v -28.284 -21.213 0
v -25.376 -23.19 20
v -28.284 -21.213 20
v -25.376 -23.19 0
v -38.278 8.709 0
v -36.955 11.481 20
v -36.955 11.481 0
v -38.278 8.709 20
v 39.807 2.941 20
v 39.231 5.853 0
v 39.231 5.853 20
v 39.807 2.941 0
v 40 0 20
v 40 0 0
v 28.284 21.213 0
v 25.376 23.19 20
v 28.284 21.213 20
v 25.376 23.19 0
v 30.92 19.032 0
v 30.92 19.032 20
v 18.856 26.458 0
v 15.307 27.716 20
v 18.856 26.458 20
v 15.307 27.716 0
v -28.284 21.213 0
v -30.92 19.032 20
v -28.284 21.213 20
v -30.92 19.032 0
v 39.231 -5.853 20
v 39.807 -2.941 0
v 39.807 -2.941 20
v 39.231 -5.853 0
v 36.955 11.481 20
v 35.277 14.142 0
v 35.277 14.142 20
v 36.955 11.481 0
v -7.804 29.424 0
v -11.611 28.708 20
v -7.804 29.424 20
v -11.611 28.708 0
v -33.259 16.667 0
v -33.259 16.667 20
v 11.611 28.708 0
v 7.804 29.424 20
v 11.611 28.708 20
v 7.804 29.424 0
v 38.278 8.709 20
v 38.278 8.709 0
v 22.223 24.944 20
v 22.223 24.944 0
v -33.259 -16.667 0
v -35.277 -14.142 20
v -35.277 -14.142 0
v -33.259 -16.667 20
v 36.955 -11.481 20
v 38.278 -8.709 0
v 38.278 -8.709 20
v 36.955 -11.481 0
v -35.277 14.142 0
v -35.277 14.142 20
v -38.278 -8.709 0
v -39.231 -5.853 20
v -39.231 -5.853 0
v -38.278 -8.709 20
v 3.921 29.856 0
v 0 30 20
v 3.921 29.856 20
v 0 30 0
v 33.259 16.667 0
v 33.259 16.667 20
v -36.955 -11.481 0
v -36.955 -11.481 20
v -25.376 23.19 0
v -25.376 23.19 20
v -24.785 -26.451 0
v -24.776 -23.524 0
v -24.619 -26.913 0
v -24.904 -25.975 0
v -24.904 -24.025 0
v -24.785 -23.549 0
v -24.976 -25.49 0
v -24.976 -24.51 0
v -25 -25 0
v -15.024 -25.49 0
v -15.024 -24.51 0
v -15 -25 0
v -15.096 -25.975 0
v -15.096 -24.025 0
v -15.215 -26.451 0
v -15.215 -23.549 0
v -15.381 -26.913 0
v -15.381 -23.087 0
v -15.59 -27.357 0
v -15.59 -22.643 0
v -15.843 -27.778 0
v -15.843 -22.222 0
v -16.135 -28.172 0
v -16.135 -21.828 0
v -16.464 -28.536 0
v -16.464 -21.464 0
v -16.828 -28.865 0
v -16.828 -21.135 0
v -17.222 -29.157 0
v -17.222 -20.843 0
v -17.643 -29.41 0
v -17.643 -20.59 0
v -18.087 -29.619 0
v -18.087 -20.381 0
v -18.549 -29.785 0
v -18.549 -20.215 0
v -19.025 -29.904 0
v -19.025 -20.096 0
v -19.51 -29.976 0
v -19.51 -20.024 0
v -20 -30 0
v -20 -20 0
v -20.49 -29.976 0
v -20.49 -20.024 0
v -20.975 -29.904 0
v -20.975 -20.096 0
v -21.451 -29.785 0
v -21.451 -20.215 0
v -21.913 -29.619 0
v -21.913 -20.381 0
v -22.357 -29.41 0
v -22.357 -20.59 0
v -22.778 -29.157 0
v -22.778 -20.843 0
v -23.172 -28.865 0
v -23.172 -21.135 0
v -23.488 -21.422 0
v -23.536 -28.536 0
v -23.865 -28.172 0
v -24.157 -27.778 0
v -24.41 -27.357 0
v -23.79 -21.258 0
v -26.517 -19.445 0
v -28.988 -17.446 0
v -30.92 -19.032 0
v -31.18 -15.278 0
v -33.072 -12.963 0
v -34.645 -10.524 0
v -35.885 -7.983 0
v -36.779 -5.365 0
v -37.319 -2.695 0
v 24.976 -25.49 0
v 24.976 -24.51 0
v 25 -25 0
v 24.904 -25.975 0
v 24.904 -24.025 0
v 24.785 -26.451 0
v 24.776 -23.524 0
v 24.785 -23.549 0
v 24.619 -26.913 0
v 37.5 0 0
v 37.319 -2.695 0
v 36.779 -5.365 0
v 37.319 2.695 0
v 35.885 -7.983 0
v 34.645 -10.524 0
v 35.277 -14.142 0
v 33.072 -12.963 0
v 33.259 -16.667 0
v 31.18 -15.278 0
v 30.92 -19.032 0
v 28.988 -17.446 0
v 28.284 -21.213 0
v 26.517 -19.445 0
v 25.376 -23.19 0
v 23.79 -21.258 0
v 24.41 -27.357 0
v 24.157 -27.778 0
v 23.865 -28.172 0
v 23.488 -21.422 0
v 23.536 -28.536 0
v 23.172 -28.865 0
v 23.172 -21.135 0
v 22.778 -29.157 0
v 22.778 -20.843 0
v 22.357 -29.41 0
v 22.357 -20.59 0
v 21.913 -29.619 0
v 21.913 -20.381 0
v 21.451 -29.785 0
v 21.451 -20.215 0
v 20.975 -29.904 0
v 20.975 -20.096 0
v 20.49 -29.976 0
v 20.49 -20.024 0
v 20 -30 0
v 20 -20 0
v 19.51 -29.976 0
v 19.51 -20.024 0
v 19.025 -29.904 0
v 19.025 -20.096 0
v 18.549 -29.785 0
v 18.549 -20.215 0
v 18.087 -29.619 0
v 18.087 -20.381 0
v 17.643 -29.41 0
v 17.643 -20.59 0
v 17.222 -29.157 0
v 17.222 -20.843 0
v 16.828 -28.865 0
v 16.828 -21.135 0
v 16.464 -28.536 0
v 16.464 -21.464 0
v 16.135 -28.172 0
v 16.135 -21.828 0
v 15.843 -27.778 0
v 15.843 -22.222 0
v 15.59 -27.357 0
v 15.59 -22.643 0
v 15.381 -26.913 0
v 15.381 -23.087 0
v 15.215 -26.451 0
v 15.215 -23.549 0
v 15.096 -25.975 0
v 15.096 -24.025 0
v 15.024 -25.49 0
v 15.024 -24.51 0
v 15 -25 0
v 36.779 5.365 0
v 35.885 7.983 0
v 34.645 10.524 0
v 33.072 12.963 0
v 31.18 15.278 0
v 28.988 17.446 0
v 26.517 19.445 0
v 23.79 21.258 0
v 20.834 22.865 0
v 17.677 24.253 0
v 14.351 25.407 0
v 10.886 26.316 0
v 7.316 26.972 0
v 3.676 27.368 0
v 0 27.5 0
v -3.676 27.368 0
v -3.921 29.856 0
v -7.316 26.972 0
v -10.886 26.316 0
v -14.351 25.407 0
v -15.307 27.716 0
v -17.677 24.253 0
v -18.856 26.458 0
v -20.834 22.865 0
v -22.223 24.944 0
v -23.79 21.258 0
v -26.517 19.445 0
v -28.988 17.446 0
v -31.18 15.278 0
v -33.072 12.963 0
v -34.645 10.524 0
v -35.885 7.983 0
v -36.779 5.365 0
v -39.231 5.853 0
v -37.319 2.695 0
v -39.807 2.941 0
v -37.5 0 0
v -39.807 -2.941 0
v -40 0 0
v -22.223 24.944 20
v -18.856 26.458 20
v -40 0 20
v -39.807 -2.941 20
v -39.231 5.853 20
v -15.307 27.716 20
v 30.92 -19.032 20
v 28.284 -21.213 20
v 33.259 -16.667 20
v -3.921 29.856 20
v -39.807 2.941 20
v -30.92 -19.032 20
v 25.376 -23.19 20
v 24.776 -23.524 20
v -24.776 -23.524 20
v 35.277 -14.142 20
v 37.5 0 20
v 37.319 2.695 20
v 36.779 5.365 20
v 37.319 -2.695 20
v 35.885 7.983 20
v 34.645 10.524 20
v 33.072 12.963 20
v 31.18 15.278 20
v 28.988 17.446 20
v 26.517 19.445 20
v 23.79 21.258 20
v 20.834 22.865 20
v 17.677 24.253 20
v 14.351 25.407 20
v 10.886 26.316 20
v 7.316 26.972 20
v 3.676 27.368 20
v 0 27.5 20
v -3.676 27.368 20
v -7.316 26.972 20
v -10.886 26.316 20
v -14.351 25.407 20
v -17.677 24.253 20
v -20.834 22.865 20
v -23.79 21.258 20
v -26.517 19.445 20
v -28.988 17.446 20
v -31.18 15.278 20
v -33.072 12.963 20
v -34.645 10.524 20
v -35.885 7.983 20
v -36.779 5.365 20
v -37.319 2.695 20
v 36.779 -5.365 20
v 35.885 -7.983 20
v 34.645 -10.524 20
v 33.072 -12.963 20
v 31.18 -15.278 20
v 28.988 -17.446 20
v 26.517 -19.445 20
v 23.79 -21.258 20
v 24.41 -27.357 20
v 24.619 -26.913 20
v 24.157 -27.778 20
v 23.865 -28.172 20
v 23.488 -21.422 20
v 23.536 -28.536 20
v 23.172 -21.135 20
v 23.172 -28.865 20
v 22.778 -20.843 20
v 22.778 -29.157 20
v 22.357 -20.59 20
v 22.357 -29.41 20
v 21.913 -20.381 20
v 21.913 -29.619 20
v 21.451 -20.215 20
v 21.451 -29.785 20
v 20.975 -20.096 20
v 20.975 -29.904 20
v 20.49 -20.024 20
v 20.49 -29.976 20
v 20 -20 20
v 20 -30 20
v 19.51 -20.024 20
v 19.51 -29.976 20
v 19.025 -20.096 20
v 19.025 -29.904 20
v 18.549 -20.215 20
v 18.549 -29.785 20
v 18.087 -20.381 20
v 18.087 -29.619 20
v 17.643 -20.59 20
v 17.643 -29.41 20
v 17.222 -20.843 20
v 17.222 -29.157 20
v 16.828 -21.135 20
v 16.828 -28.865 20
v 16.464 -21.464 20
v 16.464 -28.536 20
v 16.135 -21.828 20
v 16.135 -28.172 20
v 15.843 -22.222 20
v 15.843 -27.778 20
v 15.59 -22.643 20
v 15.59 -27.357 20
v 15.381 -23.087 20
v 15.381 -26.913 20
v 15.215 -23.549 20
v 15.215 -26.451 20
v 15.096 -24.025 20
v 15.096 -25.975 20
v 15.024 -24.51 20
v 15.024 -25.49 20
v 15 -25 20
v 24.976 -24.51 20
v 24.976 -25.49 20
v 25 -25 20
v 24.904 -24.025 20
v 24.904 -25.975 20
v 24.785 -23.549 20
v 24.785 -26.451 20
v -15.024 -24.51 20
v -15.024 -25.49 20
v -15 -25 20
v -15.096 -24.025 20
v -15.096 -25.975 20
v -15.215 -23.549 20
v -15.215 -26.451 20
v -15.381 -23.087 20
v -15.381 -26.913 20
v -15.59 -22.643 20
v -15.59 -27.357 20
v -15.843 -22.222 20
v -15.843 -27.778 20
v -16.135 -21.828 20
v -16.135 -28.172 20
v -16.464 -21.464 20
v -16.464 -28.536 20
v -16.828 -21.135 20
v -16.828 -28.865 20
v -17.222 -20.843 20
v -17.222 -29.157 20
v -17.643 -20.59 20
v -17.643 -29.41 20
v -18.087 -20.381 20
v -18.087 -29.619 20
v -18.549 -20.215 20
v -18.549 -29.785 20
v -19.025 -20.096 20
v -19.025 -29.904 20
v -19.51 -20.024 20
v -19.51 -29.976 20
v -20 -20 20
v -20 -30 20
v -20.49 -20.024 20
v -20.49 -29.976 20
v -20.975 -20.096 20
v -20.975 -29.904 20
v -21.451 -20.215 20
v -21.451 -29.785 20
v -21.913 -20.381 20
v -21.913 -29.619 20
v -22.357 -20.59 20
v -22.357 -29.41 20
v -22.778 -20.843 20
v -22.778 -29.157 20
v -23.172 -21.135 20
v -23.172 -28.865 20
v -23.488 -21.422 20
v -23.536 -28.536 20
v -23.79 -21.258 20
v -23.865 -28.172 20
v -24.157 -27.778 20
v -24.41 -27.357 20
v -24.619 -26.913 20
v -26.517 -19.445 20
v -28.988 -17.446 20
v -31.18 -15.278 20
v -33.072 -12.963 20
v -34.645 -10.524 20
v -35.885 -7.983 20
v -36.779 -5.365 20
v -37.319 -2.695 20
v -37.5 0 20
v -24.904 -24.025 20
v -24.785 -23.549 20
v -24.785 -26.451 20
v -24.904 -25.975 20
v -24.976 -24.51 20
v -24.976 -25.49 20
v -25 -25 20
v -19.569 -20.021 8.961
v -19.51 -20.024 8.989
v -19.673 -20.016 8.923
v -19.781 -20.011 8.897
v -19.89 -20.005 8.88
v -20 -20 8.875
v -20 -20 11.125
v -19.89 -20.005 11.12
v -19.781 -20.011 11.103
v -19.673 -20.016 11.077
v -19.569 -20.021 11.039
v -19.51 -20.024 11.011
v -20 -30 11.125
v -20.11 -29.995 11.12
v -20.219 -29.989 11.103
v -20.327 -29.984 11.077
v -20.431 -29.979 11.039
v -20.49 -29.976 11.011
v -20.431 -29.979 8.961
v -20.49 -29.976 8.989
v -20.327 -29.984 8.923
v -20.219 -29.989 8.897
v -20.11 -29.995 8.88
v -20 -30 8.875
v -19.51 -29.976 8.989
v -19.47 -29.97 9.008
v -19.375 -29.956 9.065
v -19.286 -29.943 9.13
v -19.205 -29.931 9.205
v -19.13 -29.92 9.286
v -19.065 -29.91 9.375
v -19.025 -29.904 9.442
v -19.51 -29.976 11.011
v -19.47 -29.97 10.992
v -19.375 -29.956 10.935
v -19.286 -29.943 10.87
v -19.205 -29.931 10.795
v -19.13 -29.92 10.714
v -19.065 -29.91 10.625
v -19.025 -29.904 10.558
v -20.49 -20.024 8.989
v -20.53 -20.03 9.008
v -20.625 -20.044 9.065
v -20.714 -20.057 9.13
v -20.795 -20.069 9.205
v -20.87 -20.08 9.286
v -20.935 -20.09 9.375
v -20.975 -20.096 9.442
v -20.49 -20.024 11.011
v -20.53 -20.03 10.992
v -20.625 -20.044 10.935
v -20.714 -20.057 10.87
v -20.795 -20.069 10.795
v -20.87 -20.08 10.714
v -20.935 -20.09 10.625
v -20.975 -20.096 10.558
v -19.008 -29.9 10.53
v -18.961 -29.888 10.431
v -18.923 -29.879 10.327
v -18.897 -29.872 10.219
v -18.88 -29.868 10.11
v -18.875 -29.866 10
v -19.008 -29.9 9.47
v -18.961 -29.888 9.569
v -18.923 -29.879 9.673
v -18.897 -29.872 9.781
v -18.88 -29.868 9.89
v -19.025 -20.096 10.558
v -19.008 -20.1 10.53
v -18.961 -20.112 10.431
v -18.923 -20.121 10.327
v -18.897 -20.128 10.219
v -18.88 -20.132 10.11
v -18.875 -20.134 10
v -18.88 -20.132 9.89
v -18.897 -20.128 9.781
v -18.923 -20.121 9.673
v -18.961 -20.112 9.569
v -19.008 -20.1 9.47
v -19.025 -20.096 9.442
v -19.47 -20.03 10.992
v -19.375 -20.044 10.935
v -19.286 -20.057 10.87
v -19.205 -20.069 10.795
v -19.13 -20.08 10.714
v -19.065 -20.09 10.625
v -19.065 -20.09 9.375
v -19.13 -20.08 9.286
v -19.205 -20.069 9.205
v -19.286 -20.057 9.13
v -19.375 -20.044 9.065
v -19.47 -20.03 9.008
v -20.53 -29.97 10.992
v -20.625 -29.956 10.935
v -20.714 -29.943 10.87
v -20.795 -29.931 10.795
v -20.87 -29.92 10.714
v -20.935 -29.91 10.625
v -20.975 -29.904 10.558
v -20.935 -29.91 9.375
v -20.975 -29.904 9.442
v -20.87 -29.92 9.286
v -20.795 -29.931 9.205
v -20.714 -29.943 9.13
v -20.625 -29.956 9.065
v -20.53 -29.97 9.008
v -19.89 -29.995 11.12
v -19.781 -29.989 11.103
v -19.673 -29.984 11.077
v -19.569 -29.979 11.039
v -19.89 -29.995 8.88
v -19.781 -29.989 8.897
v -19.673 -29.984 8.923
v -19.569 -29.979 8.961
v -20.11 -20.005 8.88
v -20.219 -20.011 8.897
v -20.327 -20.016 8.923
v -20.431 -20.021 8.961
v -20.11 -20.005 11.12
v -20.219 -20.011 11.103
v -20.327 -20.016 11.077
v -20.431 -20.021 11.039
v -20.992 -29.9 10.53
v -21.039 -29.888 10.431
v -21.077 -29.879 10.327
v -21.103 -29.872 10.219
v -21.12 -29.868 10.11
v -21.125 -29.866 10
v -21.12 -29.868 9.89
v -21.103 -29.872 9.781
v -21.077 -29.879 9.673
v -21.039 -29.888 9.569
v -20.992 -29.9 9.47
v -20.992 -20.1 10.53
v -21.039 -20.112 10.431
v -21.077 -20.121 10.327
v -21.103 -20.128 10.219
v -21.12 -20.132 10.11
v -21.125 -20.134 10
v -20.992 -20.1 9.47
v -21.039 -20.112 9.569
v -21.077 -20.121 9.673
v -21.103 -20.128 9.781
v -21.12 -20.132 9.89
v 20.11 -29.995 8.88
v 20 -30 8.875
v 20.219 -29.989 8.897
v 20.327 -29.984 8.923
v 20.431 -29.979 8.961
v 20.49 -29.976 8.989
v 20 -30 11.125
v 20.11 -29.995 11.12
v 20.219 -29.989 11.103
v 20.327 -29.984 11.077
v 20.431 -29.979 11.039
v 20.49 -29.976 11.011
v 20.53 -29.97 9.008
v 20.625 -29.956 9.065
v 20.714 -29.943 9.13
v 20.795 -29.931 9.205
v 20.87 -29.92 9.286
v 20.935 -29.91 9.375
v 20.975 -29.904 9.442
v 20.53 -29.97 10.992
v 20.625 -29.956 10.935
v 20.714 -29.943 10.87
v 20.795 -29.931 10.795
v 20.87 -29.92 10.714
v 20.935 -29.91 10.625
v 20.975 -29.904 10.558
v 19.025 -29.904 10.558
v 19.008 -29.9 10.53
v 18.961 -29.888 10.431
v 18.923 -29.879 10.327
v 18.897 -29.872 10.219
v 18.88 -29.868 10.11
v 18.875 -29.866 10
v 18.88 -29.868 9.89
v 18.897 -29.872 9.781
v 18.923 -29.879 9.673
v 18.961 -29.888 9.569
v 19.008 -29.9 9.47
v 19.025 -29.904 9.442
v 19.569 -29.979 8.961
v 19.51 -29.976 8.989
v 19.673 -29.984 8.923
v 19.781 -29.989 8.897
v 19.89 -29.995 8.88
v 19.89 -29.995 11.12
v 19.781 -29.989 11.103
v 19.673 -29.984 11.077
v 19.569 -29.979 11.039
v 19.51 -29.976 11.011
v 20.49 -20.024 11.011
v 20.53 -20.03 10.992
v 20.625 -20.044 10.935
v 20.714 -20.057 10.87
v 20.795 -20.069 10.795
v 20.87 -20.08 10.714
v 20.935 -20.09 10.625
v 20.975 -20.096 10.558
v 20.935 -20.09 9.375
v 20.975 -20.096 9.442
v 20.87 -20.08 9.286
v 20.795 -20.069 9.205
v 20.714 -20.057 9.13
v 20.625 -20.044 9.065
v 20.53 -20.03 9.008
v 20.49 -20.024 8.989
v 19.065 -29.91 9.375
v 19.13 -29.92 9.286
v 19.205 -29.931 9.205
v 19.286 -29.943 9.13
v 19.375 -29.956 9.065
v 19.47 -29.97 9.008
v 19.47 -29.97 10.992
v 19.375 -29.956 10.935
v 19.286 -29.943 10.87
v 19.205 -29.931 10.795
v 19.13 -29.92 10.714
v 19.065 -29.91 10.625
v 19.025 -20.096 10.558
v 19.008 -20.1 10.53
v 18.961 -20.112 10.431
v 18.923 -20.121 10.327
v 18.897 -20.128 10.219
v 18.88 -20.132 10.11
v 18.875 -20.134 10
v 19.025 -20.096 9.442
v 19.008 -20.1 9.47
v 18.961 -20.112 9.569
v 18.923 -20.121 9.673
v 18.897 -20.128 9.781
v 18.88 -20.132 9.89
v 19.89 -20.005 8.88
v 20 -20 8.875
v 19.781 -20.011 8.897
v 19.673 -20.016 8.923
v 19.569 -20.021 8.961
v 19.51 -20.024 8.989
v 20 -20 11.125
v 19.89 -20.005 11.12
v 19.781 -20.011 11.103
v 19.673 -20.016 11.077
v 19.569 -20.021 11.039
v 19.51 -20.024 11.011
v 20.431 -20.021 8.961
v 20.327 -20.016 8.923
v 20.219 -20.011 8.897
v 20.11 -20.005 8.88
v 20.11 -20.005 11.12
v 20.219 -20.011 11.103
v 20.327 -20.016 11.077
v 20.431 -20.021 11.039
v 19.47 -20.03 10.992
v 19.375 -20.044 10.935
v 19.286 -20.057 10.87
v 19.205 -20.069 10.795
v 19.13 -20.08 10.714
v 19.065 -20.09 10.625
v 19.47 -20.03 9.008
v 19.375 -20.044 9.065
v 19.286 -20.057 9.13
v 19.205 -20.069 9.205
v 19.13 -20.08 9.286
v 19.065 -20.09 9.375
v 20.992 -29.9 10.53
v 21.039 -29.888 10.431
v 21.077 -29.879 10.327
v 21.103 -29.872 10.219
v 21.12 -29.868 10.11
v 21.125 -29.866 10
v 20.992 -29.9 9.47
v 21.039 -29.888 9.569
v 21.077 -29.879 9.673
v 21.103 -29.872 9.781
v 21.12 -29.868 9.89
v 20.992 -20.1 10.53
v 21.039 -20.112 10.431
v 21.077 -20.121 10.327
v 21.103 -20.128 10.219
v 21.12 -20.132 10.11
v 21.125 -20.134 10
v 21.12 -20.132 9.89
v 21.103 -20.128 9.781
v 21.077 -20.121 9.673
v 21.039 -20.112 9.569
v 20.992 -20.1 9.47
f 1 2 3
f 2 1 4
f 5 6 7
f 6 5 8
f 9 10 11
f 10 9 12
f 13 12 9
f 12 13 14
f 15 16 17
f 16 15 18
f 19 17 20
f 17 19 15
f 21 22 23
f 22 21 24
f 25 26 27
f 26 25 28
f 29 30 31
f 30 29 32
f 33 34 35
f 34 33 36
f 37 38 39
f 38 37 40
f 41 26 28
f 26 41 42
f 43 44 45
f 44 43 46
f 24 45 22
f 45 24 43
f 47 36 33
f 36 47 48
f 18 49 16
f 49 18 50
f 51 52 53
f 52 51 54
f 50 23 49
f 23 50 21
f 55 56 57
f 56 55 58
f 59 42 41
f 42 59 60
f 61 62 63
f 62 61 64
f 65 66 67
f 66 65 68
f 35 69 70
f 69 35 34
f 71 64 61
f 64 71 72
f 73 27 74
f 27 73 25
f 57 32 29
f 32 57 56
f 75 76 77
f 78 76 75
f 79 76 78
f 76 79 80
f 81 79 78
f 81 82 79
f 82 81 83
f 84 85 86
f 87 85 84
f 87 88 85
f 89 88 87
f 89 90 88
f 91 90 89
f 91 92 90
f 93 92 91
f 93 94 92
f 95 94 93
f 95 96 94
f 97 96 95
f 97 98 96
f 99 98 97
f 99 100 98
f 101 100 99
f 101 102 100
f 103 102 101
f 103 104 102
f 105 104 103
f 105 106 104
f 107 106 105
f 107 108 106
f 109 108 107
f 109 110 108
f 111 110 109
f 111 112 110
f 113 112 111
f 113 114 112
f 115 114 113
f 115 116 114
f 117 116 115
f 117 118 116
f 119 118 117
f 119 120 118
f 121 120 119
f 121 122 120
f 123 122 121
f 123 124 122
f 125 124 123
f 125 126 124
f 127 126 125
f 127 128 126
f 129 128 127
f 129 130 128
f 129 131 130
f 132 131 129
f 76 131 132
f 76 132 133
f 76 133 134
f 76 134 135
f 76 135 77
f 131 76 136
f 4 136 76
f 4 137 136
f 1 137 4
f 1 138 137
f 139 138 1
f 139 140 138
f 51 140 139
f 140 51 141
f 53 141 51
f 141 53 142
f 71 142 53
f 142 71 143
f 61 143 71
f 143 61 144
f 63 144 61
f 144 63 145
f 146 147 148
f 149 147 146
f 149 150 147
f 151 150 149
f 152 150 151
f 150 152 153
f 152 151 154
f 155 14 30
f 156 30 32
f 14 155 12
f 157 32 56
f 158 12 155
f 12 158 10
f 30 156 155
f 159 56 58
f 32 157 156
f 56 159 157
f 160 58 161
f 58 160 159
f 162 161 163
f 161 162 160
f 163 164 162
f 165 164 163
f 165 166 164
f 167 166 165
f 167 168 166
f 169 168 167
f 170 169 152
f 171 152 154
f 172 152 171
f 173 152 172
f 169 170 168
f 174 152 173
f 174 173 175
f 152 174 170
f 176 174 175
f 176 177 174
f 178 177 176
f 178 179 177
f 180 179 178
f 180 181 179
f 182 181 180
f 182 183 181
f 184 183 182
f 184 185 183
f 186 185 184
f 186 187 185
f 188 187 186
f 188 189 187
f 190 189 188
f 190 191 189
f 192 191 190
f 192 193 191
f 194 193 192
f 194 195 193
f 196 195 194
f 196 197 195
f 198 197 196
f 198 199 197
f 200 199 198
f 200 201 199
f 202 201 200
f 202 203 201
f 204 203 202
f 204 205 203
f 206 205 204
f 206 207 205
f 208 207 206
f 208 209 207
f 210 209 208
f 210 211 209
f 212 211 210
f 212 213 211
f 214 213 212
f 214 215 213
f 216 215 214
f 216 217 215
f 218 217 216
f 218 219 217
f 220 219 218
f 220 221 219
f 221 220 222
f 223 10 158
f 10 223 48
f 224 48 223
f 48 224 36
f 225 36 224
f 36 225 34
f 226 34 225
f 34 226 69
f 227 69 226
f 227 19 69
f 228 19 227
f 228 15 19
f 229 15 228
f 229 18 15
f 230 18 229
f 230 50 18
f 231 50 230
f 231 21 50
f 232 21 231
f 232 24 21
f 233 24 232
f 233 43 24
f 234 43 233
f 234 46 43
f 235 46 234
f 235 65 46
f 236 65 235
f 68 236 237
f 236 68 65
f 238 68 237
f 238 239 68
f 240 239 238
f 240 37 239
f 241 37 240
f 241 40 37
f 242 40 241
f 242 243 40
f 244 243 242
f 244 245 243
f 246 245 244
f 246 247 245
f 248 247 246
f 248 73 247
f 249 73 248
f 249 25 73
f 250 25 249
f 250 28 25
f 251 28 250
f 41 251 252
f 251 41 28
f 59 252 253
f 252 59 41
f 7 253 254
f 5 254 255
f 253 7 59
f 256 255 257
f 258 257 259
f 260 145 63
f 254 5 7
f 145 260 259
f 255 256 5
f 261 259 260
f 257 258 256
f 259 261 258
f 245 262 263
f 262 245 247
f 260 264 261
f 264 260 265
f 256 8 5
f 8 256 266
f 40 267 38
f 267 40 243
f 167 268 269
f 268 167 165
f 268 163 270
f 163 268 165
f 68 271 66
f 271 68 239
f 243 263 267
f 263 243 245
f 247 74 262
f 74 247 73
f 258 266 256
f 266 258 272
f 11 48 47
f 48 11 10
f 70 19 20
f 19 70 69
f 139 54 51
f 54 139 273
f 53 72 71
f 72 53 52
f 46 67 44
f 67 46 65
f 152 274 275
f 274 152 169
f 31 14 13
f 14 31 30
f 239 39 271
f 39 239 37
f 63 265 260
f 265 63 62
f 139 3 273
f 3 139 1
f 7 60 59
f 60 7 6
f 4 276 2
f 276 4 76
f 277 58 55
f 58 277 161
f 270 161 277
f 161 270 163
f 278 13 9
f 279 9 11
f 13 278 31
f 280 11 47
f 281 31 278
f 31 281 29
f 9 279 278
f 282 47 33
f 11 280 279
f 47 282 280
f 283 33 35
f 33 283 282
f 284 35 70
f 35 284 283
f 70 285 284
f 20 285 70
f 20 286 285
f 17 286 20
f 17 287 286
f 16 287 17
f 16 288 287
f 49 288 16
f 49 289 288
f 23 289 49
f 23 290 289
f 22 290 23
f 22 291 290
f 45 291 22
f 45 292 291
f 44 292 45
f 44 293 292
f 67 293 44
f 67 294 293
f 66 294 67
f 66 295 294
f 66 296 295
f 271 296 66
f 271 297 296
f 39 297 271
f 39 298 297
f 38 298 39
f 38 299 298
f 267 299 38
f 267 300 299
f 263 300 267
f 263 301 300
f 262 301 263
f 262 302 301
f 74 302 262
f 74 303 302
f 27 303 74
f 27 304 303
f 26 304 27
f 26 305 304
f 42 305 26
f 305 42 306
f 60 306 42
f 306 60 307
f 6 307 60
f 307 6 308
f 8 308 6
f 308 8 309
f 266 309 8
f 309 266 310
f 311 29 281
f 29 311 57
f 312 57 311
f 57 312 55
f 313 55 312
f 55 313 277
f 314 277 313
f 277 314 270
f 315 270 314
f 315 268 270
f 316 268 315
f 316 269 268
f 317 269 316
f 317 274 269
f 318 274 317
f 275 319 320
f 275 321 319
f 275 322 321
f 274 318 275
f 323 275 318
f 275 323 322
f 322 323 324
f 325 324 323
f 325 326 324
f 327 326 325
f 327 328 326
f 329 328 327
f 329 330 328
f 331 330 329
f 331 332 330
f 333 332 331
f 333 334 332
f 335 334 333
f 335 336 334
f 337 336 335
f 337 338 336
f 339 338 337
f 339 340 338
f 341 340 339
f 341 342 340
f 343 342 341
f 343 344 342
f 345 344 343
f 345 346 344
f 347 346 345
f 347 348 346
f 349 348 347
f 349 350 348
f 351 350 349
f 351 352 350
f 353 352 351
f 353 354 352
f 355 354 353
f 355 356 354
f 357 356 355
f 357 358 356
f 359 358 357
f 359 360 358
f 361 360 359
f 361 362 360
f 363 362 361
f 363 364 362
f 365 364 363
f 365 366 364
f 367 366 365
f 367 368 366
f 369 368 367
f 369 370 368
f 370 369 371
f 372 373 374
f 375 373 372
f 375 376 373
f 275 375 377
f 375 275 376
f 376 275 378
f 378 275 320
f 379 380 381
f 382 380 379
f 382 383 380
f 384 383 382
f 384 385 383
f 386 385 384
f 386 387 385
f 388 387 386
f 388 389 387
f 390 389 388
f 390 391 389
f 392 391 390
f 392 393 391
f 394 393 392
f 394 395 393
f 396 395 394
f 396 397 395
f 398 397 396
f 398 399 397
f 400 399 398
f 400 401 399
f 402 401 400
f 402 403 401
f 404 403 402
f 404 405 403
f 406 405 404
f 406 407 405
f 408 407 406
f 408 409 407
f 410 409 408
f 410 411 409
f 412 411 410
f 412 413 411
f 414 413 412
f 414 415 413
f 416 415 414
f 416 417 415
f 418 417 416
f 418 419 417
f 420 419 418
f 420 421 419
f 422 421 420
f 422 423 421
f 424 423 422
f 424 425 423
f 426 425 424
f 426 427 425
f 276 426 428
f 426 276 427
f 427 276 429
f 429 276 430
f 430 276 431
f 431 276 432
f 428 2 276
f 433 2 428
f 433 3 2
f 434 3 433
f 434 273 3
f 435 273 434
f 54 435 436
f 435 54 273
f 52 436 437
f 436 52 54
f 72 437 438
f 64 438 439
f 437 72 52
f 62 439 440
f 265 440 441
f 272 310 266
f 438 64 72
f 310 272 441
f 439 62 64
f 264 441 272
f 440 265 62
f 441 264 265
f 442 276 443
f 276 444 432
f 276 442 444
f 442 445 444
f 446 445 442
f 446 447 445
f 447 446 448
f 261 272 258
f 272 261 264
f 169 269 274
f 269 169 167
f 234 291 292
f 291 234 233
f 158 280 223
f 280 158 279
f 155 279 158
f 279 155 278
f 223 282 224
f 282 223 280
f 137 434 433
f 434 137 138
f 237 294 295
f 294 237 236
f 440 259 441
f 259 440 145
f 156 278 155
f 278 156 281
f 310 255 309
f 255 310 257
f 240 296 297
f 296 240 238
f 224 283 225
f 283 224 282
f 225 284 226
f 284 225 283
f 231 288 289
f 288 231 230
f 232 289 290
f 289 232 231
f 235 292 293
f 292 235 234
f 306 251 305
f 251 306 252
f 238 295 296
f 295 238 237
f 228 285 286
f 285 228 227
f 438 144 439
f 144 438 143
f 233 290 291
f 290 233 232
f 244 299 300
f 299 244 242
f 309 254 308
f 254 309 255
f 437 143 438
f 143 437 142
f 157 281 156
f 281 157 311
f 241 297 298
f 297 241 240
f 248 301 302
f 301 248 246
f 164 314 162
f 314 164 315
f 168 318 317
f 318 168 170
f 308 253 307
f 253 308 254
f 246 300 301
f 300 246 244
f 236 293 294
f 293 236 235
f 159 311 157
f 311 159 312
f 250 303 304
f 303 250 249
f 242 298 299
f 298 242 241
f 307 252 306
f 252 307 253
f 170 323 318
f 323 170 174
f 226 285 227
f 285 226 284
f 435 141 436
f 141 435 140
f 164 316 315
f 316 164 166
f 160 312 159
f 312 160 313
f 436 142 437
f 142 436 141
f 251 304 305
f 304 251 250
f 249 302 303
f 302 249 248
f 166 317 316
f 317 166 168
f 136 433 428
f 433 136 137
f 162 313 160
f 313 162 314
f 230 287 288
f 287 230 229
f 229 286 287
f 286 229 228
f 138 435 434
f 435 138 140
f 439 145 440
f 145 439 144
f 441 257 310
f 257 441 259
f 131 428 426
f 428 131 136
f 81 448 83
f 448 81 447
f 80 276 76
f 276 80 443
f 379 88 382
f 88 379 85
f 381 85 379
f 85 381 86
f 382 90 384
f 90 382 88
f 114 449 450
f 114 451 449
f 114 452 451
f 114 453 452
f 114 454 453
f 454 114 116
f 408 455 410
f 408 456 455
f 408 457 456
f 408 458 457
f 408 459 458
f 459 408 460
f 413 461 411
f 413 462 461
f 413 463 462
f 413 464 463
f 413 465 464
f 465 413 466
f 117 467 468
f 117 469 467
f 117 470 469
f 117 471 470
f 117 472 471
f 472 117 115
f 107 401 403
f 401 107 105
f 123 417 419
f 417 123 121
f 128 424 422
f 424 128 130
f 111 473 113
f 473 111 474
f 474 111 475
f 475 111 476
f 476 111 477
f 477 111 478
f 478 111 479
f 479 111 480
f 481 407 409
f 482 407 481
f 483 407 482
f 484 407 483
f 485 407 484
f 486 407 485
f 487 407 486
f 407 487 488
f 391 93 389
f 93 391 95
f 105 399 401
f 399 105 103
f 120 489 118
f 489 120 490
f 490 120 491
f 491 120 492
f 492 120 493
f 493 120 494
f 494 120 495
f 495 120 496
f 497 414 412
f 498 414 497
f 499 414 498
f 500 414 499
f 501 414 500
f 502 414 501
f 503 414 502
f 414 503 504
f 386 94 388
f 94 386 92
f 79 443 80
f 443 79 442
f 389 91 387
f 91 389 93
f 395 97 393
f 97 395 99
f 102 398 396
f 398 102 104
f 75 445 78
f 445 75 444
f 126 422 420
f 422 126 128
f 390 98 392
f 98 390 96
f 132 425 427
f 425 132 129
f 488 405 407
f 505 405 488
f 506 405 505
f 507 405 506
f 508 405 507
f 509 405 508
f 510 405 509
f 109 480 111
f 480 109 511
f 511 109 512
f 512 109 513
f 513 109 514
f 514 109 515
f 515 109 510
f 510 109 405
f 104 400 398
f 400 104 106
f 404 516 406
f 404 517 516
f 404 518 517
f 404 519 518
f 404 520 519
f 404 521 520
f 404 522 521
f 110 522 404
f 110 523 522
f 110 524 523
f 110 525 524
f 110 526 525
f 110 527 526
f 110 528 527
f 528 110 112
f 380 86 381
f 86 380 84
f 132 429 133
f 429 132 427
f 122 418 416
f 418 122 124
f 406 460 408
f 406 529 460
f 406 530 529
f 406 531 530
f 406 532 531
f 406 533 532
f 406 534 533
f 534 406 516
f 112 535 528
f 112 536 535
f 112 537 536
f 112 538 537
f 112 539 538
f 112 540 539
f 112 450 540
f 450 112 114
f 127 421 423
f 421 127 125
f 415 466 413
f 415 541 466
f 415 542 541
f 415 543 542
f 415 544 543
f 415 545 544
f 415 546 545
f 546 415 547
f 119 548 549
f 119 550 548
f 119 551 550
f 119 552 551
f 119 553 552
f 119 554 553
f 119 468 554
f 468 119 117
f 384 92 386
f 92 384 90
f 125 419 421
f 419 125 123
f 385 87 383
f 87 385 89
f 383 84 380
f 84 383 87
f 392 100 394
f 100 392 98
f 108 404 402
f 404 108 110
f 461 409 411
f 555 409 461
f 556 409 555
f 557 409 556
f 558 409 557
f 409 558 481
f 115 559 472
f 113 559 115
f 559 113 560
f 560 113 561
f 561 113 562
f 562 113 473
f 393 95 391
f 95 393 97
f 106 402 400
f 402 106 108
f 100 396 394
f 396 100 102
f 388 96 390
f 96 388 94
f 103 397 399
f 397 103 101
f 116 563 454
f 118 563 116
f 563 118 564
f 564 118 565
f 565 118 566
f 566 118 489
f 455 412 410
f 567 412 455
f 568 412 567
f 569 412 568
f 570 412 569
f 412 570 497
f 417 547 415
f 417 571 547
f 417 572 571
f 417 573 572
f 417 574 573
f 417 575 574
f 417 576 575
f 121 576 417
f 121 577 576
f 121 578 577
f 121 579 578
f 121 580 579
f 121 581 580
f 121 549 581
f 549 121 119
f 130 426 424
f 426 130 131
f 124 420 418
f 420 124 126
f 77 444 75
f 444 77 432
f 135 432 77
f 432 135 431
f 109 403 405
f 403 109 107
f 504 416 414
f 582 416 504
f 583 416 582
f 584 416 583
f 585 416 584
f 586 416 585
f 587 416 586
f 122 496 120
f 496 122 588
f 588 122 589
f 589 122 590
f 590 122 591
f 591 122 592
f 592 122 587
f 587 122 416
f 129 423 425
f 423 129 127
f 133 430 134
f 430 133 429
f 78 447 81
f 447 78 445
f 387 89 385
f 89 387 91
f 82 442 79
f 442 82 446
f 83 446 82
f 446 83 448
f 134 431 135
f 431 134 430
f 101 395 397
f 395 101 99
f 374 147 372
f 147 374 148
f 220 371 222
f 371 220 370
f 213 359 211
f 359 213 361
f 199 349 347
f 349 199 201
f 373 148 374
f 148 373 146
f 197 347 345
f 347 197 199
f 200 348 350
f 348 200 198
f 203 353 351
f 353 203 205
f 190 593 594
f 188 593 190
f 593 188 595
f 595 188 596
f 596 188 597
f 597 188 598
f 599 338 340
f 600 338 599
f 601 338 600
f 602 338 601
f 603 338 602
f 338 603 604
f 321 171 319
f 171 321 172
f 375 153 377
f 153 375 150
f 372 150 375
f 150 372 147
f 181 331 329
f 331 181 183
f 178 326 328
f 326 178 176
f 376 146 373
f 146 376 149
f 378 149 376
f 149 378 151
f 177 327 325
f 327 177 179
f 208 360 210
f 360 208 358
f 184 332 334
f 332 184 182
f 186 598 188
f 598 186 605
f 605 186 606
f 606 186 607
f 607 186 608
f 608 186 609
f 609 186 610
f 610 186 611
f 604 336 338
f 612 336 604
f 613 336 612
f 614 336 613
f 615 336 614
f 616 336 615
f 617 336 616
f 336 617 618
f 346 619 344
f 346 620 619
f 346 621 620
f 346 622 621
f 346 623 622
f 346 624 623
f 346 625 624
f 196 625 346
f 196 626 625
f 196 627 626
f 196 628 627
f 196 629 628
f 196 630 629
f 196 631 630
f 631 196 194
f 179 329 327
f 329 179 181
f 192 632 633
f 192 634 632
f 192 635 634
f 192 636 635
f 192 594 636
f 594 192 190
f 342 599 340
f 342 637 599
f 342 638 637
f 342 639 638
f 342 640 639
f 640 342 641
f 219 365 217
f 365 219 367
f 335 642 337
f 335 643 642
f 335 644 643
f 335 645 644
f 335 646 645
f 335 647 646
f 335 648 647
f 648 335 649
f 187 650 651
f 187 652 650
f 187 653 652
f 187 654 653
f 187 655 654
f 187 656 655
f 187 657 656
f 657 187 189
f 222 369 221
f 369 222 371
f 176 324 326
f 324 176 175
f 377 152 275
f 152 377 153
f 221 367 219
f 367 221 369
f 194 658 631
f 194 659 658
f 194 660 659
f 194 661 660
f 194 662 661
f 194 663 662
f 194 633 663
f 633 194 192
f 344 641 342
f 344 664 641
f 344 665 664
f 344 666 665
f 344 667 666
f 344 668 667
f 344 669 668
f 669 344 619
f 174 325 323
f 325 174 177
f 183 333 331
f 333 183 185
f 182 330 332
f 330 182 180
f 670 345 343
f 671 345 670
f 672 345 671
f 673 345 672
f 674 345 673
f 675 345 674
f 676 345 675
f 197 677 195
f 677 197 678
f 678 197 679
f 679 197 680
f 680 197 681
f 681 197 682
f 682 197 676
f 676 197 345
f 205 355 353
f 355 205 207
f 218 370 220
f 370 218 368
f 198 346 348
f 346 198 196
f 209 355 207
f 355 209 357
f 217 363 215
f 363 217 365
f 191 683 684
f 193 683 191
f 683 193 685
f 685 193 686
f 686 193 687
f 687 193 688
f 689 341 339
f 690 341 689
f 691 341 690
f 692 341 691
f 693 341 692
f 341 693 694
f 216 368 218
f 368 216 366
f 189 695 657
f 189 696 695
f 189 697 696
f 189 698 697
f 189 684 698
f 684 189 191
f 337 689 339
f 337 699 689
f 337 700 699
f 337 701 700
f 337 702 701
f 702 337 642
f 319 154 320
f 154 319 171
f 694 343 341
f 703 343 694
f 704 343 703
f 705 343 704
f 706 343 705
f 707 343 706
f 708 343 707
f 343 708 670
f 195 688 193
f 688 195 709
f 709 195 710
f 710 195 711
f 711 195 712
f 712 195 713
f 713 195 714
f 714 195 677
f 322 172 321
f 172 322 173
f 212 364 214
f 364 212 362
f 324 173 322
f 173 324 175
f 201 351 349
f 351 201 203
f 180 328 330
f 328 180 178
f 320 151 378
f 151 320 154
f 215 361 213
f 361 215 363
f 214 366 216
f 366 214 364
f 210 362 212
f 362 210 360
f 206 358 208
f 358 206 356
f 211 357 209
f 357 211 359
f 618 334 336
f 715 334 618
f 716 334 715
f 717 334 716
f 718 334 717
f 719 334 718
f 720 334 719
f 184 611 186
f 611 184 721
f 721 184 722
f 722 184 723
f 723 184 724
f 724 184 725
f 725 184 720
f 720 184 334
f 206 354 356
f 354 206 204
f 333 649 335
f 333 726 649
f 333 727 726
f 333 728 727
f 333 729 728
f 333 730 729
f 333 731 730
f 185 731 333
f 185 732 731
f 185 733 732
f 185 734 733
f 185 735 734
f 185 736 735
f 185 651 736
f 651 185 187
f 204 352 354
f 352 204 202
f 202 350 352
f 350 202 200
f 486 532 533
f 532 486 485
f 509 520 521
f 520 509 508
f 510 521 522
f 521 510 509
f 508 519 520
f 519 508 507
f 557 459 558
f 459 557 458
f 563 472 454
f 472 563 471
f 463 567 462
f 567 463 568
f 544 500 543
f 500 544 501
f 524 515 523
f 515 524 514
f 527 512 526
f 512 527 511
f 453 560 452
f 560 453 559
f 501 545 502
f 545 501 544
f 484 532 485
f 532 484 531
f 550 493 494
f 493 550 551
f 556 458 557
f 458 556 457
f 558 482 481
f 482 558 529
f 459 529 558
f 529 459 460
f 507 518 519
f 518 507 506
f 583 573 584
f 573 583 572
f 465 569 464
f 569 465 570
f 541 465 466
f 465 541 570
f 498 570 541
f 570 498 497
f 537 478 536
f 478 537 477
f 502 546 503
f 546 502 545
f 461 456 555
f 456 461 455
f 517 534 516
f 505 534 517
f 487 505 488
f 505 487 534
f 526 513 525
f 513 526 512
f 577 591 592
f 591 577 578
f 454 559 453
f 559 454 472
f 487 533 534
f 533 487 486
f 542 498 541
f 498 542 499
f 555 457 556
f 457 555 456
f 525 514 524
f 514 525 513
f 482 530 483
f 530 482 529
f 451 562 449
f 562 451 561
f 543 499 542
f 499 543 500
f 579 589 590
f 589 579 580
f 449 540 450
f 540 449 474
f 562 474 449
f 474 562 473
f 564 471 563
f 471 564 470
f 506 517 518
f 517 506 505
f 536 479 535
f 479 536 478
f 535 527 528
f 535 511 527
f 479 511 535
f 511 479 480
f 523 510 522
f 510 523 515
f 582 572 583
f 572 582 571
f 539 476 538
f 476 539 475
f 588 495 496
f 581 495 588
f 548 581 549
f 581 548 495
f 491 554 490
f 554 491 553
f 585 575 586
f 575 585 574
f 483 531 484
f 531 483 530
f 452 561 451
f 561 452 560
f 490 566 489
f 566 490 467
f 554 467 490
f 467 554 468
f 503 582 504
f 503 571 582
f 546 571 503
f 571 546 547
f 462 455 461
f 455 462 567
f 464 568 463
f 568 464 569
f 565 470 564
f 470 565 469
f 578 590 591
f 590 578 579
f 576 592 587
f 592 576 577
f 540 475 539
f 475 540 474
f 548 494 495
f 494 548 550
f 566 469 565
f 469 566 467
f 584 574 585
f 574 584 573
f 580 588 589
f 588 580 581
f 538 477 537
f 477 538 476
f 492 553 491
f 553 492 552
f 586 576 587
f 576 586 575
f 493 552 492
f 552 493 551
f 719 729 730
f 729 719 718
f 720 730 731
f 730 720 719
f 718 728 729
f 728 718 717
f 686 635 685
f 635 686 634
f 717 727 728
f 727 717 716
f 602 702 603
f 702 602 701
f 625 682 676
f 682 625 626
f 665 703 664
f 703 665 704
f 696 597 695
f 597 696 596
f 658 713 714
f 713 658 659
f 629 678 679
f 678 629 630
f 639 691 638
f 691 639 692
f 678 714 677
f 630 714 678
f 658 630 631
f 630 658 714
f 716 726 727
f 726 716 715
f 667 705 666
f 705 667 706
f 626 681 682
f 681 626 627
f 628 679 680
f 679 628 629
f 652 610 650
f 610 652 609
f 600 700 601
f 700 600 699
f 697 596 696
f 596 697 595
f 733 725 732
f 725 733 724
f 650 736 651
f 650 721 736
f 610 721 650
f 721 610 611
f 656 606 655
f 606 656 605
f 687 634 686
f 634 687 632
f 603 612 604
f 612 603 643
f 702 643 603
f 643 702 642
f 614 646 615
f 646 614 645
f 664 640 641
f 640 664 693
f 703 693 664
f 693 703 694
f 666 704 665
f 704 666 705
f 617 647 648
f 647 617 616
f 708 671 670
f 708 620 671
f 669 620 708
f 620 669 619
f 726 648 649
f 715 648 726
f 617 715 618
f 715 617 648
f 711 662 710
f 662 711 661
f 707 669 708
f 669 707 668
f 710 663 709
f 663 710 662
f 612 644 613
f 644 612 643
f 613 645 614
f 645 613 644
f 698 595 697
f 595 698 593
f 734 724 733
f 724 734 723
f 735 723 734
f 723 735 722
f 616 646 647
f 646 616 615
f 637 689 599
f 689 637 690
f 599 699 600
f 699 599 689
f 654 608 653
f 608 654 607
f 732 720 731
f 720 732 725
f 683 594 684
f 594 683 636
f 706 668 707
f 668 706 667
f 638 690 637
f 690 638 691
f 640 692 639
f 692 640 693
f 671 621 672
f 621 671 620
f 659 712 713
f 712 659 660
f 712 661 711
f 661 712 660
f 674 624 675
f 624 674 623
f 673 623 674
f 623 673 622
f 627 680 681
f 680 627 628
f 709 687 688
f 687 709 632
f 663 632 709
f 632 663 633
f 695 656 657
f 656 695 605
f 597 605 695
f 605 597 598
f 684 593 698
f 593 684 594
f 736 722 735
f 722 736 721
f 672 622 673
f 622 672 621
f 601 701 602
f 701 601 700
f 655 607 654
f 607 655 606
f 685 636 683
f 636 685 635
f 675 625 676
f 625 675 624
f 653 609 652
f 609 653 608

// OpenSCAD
//###### VARIABLES ######
// width (to fit around wide part of wrist)
braceletWidth = 80.0;

// height (to fit around tall part of wrist)
braceletHeight = 60.0;

// size of the band on top (like looking at a watch face)
braceletDepth = 20;

// size of the band around (like the thickness of a watch band)
braceletThickness = 5;

// if true, will create an opening and gripping cylinders on the end
braceletIsOpen = true;
braceletOpening = braceletWidth/2;

// diameter of the gripping cylinders if it's an open shape bracelet
gripSize = 10;

// size of the mounting holes (for 3d scanning - set to 0 to remove)
mountHoleDiameter = 2.25;

// if true, will create a label tag on top with the width and height displayed for easy reference
showLabel = false; 
labelWidth = 30;
labelHeight = 8;
labelFontSize = 5;

//###### COMMON OPEN SIZES ######
/*

++Size++ (Width x Height)

XL (80 x 60)
L (73.5 x 55.13)
M (67 x 50.25)
S (60 x 40)

//###### COMMON CLOSED SIZES ######

++Size++ (Width x Height)

XL (95 x 71)
L (88 x 66)
M (80 x 60)
S (73 x 55)

*/

//###### OVAL (helper module) ######
module __oval(w, h, depth, center = false) {
  scale([1, h/w, 1]) cylinder(h=depth, d=w, center=center);
}

//###### MOUNTING HOLES ######
module braceletMountingHoles() {
  if (mountHoleDiameter > 0) {
    // left hole
    translate([-braceletOpening/2, -gripSize*1.5 + mountHoleDiameter/2, braceletDepth/2])
      rotate([90, 0, 0])
        cylinder(h=gripSize*2, d=mountHoleDiameter);
    // right hole
    translate([braceletOpening/2, -gripSize*1.5 + mountHoleDiameter/2, braceletDepth/2])
      rotate([90, 0, 0])
       cylinder(h=gripSize*2, d=mountHoleDiameter);
  }
}

//###### BRACELET LABEL ######
module braceletLabel() {
  // if a label is requested, create a box on top and place the width and height in text
  if (showLabel) {
    translate([-labelWidth/2, braceletHeight/2 - braceletThickness/2, 0]) {
      difference() {
        // label tag
        cube([labelWidth, labelHeight, braceletDepth]);
        // cut out size text
        translate([labelWidth/2, 2, braceletDepth/2])
          linear_extrude(braceletDepth)
            text(str(braceletWidth, "x", braceletDepth), size=labelFontSize, halign="center");
      }
    }
  }
}

//###### BRACELET MAIN SHAPE ######
module bracelet() {
  // main bracelet shape
  difference() {
    // overall bracelet shape
    __oval(braceletWidth, braceletHeight, braceletDepth);
    // cut out the middle to create the band
    translate([0,0,-1]) __oval(braceletWidth-braceletThickness, braceletHeight-braceletThickness, braceletDepth*2);
    // if the bracelet is an open shape, cut out the opening
    if (braceletIsOpen) {
      rotate([0, 0, 180]) translate([-braceletOpening/2, 0, -1]) 
        cube([braceletOpening, braceletHeight*2, braceletDepth*2]);
    }
  }
  // if the bracelet is an open shape, add the end cylinders
  if (braceletIsOpen) {
    // left grip
    translate([-braceletOpening/2, -braceletHeight/2 + gripSize/2, 0])
      cylinder(h=braceletDepth, d=gripSize);
    // right grip
    translate([braceletOpening/2, -braceletHeight/2 + gripSize/2, 0])
      cylinder(h=braceletDepth, d=gripSize);
  }
  
  // label
  braceletLabel(); // create a label to show the width and height
}

//###### OUTPUT ######
$fn=64; // higher number makes a smoother curve

if (mountHoleDiameter > 0) {
  difference() {
    bracelet();
    braceletMountingHoles();
  }
} else {
  bracelet();
}
